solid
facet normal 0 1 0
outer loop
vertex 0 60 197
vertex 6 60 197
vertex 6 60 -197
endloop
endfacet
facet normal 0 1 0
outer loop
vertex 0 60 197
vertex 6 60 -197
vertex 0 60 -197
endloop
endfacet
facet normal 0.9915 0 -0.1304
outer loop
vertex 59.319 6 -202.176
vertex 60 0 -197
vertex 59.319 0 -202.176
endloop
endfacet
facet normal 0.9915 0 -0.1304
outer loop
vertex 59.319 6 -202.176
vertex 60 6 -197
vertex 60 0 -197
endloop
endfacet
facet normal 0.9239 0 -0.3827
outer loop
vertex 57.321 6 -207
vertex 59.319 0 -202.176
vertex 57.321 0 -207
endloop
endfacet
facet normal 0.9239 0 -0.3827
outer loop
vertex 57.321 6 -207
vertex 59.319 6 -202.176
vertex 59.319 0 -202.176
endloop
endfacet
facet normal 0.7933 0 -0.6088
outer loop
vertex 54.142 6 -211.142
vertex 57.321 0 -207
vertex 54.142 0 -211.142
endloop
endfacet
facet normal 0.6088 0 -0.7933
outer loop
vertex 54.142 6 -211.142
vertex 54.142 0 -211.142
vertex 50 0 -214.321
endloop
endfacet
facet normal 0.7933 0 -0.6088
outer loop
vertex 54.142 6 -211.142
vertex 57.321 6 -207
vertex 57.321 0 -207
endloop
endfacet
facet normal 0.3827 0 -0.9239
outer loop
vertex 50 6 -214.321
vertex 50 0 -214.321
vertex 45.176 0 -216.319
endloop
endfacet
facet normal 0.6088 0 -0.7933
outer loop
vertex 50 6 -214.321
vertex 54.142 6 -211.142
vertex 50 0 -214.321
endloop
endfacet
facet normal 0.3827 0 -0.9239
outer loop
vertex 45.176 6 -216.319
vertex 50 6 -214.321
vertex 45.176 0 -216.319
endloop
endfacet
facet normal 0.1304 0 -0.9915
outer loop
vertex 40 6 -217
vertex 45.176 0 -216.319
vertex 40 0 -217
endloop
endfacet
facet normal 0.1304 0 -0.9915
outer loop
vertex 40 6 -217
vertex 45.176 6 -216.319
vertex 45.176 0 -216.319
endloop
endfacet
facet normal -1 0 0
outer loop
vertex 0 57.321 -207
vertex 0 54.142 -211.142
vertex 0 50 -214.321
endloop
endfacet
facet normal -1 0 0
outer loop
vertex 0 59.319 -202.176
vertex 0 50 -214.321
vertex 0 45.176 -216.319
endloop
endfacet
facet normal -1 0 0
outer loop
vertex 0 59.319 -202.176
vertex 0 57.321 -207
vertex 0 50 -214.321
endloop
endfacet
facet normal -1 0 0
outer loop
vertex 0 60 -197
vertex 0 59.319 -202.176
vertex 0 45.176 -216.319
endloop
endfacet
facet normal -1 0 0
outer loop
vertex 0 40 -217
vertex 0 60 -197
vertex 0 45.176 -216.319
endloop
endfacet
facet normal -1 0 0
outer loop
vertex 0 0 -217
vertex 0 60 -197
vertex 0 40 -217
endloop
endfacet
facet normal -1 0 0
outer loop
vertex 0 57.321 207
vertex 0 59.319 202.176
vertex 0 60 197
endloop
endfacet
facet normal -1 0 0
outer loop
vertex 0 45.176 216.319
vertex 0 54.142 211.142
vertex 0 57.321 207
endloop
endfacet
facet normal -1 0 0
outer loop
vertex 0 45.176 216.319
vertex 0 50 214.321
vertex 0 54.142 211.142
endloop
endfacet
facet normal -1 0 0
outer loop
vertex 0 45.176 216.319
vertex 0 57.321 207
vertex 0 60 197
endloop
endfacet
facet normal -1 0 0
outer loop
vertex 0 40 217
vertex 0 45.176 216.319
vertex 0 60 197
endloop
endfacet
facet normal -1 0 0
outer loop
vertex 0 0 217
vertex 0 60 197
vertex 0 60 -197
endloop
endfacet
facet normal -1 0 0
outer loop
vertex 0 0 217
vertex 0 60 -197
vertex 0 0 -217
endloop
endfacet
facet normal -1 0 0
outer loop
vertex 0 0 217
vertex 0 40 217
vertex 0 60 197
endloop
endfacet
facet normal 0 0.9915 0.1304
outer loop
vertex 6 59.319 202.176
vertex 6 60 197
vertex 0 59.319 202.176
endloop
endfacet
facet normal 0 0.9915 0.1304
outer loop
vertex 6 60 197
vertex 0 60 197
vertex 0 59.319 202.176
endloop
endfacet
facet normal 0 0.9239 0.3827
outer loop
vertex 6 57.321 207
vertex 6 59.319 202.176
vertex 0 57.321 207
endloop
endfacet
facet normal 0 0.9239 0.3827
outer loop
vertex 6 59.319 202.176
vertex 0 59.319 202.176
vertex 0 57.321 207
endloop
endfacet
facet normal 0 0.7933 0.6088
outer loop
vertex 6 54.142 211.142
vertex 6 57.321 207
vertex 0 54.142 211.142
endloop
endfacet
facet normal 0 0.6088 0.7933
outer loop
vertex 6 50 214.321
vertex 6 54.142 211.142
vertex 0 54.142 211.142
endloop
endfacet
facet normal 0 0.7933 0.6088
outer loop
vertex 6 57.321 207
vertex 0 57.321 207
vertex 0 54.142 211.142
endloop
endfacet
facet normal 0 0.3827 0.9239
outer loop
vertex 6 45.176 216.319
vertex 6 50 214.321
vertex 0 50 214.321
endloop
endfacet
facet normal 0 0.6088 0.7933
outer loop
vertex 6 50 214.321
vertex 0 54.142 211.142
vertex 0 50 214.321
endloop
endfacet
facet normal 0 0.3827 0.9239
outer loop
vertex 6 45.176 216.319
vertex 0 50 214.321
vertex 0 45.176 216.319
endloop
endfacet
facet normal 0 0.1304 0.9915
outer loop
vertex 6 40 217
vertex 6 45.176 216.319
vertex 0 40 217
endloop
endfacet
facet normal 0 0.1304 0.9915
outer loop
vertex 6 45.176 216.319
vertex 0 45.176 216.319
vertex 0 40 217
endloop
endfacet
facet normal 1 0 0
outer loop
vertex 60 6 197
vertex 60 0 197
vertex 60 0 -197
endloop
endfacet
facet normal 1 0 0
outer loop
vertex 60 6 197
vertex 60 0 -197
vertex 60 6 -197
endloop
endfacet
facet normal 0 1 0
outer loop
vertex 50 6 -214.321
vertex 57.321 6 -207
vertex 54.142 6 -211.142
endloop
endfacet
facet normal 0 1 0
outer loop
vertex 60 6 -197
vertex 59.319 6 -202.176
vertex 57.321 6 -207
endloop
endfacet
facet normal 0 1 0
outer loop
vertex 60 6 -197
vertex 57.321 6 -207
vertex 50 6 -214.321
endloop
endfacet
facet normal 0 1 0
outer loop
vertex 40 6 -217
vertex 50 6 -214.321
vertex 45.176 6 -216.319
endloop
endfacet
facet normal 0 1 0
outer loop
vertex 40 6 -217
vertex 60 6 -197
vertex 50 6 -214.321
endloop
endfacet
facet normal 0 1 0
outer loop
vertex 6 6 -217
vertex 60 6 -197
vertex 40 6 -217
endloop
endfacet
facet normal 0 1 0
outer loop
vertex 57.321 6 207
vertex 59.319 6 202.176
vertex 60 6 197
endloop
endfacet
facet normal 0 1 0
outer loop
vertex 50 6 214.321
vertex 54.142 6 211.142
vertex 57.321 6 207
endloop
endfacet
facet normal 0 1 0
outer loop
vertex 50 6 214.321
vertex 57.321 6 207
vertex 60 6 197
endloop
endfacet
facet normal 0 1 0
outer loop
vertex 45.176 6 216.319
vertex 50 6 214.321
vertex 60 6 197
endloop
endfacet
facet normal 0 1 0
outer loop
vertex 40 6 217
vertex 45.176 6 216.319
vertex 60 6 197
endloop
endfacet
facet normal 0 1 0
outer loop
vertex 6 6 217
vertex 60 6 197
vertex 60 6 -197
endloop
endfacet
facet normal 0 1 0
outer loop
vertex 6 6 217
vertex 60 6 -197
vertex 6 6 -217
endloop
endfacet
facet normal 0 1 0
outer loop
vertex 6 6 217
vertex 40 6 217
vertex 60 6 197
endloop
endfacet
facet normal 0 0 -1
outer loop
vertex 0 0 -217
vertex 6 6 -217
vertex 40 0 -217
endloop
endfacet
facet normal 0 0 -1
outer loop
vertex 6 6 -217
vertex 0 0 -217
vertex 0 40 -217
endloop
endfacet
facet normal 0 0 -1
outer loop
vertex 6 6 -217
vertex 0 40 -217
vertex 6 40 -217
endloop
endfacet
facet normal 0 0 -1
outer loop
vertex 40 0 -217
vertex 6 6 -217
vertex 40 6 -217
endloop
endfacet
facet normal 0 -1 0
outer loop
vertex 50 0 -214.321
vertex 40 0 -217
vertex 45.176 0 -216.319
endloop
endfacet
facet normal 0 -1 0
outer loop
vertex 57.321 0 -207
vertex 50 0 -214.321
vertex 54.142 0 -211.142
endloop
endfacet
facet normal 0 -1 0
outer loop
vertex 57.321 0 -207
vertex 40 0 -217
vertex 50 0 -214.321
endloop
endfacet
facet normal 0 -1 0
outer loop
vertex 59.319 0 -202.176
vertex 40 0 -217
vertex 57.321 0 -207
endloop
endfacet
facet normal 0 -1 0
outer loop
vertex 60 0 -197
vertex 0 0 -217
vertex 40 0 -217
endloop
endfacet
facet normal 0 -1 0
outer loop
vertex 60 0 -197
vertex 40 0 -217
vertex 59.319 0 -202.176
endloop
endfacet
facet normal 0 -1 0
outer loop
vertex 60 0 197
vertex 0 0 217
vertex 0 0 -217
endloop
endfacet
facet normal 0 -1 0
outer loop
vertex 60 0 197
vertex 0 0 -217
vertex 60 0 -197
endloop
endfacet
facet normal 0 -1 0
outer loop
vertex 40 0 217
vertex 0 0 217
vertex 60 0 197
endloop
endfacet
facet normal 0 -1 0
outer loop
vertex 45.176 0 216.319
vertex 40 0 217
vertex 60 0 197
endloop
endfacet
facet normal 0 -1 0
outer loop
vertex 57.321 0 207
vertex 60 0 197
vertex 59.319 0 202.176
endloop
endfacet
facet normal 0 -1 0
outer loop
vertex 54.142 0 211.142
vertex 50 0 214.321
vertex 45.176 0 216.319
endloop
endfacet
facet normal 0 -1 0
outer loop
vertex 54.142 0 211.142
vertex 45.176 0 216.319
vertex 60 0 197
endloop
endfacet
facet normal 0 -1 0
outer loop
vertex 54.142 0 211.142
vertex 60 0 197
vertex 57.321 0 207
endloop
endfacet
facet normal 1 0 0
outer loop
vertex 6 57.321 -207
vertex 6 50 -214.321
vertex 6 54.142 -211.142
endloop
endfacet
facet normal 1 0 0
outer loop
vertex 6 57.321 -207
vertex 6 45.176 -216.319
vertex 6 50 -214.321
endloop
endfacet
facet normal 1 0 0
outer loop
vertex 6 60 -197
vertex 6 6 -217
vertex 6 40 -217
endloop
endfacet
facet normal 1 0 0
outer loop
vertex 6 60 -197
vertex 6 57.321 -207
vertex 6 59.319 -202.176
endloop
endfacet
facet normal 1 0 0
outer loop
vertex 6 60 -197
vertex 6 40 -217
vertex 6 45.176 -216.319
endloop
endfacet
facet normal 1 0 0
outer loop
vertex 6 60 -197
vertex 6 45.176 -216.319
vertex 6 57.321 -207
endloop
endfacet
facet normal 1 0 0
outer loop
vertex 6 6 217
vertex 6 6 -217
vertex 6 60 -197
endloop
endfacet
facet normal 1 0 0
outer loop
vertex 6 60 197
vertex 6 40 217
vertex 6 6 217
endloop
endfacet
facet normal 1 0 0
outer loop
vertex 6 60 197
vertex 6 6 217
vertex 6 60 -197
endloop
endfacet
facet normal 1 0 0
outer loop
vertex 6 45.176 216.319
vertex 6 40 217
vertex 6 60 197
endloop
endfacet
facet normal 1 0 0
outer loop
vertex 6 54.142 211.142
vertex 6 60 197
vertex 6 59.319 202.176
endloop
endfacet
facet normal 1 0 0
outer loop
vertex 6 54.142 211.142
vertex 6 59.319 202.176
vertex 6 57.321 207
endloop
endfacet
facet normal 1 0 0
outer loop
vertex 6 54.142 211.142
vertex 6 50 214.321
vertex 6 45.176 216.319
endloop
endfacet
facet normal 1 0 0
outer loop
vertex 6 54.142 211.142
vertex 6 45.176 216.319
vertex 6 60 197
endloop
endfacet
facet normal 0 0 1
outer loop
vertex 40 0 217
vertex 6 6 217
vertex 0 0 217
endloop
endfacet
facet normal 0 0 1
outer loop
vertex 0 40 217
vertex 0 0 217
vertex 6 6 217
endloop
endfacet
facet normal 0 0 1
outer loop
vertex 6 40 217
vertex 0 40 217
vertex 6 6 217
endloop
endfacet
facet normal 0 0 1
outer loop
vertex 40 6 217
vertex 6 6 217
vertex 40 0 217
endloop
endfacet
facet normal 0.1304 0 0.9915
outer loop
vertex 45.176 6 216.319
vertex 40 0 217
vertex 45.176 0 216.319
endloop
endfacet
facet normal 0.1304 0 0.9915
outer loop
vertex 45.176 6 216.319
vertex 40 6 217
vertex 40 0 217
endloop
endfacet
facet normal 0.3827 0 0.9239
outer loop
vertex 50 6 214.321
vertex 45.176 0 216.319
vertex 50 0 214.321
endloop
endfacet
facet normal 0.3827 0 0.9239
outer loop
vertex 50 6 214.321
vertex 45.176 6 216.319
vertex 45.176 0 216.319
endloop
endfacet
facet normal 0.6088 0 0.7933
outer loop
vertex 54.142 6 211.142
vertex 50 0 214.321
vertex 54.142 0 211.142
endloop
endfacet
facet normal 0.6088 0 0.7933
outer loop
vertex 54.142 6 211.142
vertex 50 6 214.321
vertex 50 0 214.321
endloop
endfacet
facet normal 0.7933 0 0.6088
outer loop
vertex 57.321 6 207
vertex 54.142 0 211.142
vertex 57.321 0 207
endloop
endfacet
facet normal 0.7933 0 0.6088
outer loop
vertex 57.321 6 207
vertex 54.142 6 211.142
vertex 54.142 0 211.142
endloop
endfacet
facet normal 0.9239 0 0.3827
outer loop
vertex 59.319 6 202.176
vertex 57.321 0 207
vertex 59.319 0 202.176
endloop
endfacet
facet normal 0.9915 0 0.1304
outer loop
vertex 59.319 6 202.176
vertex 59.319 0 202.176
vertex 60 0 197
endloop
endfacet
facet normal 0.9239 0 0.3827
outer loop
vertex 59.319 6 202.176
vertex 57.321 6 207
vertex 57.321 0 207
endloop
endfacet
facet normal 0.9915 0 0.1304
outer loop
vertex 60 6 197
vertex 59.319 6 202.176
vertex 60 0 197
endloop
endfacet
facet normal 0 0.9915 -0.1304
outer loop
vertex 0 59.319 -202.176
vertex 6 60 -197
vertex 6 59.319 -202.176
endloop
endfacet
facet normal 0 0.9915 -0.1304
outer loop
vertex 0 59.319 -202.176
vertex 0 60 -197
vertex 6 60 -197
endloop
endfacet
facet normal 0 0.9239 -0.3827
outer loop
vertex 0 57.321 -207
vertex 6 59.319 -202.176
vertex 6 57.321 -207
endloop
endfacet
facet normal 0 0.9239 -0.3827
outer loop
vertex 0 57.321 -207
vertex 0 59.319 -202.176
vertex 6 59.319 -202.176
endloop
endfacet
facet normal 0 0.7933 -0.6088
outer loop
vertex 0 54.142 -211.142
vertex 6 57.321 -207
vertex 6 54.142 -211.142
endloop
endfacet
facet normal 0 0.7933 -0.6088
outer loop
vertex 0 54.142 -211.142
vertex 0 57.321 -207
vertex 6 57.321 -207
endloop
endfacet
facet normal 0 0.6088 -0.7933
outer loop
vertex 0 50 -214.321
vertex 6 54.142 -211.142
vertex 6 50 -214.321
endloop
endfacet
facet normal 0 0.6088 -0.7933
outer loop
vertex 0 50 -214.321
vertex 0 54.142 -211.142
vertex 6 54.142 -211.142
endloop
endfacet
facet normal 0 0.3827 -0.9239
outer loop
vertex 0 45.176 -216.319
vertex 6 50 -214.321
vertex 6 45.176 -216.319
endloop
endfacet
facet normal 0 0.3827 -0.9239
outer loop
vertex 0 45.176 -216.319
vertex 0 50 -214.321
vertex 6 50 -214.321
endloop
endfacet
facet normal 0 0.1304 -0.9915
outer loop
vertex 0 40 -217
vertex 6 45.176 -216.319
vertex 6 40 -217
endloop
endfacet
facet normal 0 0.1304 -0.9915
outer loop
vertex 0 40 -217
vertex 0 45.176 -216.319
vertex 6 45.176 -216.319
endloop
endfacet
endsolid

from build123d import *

# Parameters (mm, degrees)
EXTRUDE_1_DEPTH = 217
FILLET_1_R      = 20


with BuildPart() as part:
    # Эскиз1 → Бобышка-Вытянуть1 (new, symmetric)
    with BuildSketch(Plane.XY):
        Polygon((0, 0), (60, 0), (60, 6), (6, 6), (6, 60), (0, 60), align=None)
    extrude(amount=EXTRUDE_1_DEPTH, both=True)

    # Скругление1
    fillet_1_edges = [part.edges().sort_by_distance(p)[0] for p in [
        (60, 3, 217),
        (3, 60, 217),
        (3, 60, -217),
        (60, 3, -217),
    ]]
    fillet(fillet_1_edges, radius=FILLET_1_R)


solid = part.part
